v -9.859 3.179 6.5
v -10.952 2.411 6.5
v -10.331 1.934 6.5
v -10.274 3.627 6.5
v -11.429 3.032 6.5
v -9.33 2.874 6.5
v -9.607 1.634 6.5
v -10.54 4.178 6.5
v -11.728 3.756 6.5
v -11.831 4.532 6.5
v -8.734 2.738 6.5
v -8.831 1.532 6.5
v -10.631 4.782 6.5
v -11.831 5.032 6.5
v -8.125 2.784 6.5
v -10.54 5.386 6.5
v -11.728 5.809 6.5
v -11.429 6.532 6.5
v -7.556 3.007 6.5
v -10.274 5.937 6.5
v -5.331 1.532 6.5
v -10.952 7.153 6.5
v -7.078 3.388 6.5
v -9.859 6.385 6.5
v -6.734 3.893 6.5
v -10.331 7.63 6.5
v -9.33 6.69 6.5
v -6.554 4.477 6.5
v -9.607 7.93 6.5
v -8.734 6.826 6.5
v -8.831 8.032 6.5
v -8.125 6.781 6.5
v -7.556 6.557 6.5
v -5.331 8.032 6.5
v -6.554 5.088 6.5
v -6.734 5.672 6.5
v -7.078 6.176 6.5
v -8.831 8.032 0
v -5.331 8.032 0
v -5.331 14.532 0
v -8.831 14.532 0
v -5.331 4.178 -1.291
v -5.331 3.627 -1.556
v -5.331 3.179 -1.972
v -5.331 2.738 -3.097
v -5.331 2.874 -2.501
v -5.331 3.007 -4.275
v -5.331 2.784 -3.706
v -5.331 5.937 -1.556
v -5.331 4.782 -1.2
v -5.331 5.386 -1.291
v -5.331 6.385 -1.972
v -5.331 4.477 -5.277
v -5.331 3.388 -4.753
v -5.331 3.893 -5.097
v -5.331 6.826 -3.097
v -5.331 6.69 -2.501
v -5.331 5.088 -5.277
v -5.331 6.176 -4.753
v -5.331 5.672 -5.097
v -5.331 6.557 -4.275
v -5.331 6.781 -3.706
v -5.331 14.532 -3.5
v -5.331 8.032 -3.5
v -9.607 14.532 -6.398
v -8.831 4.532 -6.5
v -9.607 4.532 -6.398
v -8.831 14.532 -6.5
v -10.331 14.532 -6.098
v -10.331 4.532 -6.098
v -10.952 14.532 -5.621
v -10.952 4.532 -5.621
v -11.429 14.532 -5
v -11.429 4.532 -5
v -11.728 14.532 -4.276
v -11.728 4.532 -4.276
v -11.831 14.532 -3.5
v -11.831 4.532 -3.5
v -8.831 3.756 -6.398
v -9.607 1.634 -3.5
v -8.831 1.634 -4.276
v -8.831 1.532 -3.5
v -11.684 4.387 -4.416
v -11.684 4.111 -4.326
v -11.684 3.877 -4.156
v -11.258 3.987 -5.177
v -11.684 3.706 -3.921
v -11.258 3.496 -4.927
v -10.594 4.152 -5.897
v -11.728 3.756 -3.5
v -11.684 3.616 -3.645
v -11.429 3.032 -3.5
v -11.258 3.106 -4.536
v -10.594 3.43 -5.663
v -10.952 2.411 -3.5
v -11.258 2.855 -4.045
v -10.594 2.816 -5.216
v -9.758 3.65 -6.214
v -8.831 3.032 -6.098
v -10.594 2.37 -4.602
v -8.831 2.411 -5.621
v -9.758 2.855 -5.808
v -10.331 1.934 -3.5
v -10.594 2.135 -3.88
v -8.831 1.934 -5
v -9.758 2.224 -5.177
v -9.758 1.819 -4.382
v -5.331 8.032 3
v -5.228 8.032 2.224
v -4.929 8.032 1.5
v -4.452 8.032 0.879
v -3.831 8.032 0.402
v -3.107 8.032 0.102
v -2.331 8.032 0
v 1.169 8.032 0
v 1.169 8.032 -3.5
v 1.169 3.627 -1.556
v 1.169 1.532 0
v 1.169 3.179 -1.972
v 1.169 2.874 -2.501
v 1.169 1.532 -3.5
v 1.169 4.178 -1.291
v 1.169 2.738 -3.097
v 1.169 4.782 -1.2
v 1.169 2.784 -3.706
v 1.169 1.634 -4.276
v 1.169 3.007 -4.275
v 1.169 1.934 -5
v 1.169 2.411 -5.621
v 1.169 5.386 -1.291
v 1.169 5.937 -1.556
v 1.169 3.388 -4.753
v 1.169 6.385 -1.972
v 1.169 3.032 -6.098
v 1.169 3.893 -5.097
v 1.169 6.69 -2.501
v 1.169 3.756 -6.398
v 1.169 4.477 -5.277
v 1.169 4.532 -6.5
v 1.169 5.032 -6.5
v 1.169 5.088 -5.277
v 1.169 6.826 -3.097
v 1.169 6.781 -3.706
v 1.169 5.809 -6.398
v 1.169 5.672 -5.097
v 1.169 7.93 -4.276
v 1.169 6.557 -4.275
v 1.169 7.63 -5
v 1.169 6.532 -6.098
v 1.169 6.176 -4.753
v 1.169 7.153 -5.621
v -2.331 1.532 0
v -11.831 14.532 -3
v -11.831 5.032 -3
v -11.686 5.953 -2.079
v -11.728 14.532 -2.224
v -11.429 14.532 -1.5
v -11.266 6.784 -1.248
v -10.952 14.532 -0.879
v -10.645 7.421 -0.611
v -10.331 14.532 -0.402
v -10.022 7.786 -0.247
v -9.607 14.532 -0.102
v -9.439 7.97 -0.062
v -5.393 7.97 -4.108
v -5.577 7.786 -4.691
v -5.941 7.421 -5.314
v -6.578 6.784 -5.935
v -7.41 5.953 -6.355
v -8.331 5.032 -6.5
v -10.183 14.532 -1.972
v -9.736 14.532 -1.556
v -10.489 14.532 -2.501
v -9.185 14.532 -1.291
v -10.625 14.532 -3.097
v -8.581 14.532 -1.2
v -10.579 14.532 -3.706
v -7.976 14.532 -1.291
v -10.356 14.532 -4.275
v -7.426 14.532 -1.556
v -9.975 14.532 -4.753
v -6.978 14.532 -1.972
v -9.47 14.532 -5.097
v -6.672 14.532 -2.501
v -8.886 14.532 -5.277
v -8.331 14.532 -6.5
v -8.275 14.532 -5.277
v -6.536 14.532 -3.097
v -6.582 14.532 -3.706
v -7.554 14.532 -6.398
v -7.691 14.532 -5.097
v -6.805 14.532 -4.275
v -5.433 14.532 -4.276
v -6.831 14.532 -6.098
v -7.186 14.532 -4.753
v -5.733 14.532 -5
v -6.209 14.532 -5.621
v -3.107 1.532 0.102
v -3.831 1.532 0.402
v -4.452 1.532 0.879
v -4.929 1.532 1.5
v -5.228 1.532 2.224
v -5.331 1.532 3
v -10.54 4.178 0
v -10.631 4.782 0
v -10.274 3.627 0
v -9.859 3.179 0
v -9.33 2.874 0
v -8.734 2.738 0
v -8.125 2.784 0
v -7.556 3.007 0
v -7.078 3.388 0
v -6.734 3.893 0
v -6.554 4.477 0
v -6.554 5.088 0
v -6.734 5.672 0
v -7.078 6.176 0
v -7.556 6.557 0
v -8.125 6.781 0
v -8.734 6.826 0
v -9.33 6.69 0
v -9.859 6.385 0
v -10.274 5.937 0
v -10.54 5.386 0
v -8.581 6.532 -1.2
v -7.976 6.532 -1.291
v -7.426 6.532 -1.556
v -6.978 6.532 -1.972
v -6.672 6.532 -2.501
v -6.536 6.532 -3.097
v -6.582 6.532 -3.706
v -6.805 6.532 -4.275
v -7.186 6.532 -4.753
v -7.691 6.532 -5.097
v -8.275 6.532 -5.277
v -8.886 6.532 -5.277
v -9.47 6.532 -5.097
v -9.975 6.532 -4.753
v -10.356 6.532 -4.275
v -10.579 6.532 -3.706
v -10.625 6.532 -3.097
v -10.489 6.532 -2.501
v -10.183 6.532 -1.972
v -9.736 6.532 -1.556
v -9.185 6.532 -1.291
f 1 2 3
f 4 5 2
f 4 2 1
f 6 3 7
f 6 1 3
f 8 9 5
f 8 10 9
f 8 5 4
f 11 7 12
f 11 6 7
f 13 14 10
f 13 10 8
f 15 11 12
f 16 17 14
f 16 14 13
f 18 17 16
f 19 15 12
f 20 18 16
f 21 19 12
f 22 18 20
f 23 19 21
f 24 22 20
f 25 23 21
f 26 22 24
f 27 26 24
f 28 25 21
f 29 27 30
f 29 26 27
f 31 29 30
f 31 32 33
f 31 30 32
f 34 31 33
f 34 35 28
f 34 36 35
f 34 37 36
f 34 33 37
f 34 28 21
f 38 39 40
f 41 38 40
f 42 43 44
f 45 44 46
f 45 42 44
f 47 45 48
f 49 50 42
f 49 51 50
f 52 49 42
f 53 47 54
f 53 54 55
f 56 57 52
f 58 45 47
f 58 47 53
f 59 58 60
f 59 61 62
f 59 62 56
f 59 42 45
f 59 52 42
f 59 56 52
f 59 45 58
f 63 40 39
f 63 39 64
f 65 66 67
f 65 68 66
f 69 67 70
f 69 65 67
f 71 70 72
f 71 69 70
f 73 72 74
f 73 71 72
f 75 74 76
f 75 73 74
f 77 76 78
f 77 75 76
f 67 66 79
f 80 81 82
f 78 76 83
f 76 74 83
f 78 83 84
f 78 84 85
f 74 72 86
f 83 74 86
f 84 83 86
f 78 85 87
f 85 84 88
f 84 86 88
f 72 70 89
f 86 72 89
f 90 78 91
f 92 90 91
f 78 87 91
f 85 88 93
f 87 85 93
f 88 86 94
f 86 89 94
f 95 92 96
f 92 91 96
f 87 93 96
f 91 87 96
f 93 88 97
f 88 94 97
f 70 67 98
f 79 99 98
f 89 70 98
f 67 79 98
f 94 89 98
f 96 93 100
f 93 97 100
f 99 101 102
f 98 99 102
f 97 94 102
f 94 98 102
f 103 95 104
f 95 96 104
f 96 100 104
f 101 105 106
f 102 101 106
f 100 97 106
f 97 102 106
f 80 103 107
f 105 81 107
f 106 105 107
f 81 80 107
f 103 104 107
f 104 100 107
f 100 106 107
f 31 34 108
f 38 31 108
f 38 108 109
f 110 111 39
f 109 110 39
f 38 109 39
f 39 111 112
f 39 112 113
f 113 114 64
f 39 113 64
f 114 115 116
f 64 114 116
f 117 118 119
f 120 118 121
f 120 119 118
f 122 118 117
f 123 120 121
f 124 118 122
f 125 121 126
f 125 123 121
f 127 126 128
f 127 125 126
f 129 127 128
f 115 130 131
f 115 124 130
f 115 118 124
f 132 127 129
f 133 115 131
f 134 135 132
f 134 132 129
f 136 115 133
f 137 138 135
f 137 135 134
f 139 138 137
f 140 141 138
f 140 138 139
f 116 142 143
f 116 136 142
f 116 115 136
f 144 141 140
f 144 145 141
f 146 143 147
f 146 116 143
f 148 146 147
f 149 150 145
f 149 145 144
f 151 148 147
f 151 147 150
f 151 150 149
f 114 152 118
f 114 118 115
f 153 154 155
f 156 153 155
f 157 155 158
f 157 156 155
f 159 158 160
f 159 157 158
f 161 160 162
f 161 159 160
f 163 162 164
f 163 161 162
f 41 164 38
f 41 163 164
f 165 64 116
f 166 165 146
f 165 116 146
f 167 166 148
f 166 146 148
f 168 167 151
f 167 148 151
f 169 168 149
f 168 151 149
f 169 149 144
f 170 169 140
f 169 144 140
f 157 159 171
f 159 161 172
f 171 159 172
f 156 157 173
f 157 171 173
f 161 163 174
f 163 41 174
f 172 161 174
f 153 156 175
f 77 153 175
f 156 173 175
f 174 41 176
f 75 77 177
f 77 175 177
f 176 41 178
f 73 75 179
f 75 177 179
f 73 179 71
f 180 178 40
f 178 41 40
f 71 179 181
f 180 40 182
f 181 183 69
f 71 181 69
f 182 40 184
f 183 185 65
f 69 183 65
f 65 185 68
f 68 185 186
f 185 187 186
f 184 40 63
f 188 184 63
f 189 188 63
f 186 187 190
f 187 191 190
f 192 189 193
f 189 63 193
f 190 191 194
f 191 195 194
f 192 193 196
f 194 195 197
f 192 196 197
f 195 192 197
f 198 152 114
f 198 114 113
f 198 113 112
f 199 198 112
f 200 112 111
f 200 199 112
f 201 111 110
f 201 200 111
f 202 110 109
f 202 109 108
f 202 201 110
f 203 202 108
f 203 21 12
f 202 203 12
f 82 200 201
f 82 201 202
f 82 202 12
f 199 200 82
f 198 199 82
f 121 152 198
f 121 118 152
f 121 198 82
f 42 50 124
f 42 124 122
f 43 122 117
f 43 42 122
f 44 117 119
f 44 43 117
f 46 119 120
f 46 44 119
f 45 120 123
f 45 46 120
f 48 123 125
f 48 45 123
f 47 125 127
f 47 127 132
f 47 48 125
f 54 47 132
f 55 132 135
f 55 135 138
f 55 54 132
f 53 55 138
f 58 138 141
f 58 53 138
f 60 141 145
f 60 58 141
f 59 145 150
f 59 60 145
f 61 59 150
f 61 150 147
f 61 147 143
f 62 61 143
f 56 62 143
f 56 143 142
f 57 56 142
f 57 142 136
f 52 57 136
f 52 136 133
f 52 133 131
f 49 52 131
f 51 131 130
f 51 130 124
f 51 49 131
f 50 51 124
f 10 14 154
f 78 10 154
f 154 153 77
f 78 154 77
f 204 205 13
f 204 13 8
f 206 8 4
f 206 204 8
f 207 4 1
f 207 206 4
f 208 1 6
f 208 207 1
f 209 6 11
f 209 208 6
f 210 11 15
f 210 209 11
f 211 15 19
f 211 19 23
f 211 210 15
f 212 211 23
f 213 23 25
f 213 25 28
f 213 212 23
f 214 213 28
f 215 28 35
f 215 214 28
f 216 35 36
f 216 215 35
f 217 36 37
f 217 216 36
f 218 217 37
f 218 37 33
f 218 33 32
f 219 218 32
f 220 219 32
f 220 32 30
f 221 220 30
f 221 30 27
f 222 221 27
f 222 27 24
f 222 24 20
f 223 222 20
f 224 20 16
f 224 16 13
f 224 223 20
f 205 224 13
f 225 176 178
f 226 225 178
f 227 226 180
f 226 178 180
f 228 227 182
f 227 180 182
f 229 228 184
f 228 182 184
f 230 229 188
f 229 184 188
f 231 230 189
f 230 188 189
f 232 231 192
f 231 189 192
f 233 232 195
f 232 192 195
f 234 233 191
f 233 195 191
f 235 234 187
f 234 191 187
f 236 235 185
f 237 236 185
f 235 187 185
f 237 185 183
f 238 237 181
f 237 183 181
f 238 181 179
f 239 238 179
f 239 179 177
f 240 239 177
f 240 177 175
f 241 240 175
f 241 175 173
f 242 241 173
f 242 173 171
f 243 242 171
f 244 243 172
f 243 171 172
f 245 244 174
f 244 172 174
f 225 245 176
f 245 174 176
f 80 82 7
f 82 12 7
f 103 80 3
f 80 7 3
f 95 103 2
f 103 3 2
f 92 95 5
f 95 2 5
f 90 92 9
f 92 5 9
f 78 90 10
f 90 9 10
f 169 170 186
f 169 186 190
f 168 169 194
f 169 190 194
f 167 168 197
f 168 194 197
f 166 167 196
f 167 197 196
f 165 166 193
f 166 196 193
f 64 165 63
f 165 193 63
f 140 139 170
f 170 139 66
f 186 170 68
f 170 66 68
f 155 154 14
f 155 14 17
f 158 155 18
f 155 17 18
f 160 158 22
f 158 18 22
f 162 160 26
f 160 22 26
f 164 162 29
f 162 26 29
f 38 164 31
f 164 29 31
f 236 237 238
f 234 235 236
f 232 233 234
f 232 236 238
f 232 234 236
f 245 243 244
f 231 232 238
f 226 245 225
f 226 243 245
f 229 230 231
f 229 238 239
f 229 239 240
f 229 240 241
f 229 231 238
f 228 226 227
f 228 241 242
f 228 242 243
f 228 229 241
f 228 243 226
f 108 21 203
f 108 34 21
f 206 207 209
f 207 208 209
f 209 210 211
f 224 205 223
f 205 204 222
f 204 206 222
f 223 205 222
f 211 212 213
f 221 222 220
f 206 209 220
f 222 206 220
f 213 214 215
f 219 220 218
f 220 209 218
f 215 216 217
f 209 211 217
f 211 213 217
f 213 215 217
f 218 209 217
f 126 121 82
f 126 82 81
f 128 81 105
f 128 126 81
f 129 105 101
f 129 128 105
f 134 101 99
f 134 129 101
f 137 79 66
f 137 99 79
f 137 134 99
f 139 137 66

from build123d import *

# Parameters (mm, degrees)
SKETCH_1_W          = 6.5
SKETCH_1_H          = 6.5
SKETCH_1_R          = 2.05
EXTRUDE_1_DEPTH     = 6.5
SKETCH_2_W          = 6.5
SKETCH_2_H          = 13
EXTRUDE_2_DEPTH     = 6.5
SKETCH_3_W          = 6.5
SKETCH_3_H          = 6.5
SKETCH_3_R          = 2.05
EXTRUDE_3_DEPTH     = 6.5
SKETCH_4_R          = 2.05
CUT_EXTRUDE_1_DEPTH = 8
FILLET_1_R          = 3
FILLET_2_R          = 3


with BuildPart() as part:
    # 草图1 → 凸台-拉伸1 (new body)
    with BuildSketch(Plane.XY):
        with Locations((-8.580694703, 4.782128964)):
            Rectangle(SKETCH_1_W, SKETCH_1_H)
        with Locations(Location((-8.580694703, 4.782128964, 0), (0, 0, 180))):
            Circle(SKETCH_1_R, mode=Mode.SUBTRACT)
    extrude(amount=EXTRUDE_1_DEPTH)

    # 草图2 → 凸台-拉伸2 (add)
    with BuildSketch(Plane(origin=(-5.330694703, 0, 0), x_dir=(0, 0, -1), z_dir=(1, 0, 0))):
        with Locations((3.25, 8.032128964)):
            Rectangle(SKETCH_2_W, SKETCH_2_H)
    extrude(amount=-EXTRUDE_2_DEPTH)

    # 草图3 → 凸台-拉伸3 (add)
    with BuildSketch(Plane(origin=(-5.330694703, 0, 0), x_dir=(0, 0, -1), z_dir=(1, 0, 0))):
        with Locations((3.25, 4.782128964)):
            Rectangle(SKETCH_3_W, SKETCH_3_H)
        with Locations(Location((3.25, 4.782128964, 0), (0, 0, 180))):
            Circle(SKETCH_3_R, mode=Mode.SUBTRACT)
    extrude(amount=EXTRUDE_3_DEPTH)

    # 草图4 → 切除-拉伸1 (cut)
    with BuildSketch(Plane(origin=(0, 14.532128964, 0), x_dir=(1, 0, 0), z_dir=(0, 1, 0))):
        with Locations(Location((-8.580694703, 3.25, 0), (0, 0, 270))):
            Circle(SKETCH_4_R)
    extrude(amount=-CUT_EXTRUDE_1_DEPTH, mode=Mode.SUBTRACT)

    # 圆角1
    fillet_1_edges = [part.edges().sort_by_distance(p)[0] for p in [
        (-5.330694703, 1.532128964, -6.5),
        (-11.830694703, 11.282128964, 0),
        (-11.830694703, 8.032128964, -6.5),
        (-5.330694703, 11.282128964, -6.5),
        (-2.080694703, 8.032128964, -6.5),
        (-11.830694703, 1.532128964, 0),
        (-11.830694703, 8.032128964, 3.25),
    ]]
    fillet(fillet_1_edges, radius=FILLET_1_R)

    # 圆角2
    # the kernel refuses this fillet: 3 mm, written as the material it adds along each edge
    with BuildSketch(Plane(origin=(-5.330694703, 1.532128964, 0), x_dir=(0, 0, 1), z_dir=(0, 1, 0))) as fillet_2_piece_1:
        with BuildLine():
            CenterArc((FILLET_2_R, FILLET_2_R), FILLET_2_R, 180, 90)
            Line((0, FILLET_2_R), (0, 0))
            Line((0, 0), (FILLET_2_R, 0))
        make_face()
    extrude(amount=6.5)


solid = part.part
